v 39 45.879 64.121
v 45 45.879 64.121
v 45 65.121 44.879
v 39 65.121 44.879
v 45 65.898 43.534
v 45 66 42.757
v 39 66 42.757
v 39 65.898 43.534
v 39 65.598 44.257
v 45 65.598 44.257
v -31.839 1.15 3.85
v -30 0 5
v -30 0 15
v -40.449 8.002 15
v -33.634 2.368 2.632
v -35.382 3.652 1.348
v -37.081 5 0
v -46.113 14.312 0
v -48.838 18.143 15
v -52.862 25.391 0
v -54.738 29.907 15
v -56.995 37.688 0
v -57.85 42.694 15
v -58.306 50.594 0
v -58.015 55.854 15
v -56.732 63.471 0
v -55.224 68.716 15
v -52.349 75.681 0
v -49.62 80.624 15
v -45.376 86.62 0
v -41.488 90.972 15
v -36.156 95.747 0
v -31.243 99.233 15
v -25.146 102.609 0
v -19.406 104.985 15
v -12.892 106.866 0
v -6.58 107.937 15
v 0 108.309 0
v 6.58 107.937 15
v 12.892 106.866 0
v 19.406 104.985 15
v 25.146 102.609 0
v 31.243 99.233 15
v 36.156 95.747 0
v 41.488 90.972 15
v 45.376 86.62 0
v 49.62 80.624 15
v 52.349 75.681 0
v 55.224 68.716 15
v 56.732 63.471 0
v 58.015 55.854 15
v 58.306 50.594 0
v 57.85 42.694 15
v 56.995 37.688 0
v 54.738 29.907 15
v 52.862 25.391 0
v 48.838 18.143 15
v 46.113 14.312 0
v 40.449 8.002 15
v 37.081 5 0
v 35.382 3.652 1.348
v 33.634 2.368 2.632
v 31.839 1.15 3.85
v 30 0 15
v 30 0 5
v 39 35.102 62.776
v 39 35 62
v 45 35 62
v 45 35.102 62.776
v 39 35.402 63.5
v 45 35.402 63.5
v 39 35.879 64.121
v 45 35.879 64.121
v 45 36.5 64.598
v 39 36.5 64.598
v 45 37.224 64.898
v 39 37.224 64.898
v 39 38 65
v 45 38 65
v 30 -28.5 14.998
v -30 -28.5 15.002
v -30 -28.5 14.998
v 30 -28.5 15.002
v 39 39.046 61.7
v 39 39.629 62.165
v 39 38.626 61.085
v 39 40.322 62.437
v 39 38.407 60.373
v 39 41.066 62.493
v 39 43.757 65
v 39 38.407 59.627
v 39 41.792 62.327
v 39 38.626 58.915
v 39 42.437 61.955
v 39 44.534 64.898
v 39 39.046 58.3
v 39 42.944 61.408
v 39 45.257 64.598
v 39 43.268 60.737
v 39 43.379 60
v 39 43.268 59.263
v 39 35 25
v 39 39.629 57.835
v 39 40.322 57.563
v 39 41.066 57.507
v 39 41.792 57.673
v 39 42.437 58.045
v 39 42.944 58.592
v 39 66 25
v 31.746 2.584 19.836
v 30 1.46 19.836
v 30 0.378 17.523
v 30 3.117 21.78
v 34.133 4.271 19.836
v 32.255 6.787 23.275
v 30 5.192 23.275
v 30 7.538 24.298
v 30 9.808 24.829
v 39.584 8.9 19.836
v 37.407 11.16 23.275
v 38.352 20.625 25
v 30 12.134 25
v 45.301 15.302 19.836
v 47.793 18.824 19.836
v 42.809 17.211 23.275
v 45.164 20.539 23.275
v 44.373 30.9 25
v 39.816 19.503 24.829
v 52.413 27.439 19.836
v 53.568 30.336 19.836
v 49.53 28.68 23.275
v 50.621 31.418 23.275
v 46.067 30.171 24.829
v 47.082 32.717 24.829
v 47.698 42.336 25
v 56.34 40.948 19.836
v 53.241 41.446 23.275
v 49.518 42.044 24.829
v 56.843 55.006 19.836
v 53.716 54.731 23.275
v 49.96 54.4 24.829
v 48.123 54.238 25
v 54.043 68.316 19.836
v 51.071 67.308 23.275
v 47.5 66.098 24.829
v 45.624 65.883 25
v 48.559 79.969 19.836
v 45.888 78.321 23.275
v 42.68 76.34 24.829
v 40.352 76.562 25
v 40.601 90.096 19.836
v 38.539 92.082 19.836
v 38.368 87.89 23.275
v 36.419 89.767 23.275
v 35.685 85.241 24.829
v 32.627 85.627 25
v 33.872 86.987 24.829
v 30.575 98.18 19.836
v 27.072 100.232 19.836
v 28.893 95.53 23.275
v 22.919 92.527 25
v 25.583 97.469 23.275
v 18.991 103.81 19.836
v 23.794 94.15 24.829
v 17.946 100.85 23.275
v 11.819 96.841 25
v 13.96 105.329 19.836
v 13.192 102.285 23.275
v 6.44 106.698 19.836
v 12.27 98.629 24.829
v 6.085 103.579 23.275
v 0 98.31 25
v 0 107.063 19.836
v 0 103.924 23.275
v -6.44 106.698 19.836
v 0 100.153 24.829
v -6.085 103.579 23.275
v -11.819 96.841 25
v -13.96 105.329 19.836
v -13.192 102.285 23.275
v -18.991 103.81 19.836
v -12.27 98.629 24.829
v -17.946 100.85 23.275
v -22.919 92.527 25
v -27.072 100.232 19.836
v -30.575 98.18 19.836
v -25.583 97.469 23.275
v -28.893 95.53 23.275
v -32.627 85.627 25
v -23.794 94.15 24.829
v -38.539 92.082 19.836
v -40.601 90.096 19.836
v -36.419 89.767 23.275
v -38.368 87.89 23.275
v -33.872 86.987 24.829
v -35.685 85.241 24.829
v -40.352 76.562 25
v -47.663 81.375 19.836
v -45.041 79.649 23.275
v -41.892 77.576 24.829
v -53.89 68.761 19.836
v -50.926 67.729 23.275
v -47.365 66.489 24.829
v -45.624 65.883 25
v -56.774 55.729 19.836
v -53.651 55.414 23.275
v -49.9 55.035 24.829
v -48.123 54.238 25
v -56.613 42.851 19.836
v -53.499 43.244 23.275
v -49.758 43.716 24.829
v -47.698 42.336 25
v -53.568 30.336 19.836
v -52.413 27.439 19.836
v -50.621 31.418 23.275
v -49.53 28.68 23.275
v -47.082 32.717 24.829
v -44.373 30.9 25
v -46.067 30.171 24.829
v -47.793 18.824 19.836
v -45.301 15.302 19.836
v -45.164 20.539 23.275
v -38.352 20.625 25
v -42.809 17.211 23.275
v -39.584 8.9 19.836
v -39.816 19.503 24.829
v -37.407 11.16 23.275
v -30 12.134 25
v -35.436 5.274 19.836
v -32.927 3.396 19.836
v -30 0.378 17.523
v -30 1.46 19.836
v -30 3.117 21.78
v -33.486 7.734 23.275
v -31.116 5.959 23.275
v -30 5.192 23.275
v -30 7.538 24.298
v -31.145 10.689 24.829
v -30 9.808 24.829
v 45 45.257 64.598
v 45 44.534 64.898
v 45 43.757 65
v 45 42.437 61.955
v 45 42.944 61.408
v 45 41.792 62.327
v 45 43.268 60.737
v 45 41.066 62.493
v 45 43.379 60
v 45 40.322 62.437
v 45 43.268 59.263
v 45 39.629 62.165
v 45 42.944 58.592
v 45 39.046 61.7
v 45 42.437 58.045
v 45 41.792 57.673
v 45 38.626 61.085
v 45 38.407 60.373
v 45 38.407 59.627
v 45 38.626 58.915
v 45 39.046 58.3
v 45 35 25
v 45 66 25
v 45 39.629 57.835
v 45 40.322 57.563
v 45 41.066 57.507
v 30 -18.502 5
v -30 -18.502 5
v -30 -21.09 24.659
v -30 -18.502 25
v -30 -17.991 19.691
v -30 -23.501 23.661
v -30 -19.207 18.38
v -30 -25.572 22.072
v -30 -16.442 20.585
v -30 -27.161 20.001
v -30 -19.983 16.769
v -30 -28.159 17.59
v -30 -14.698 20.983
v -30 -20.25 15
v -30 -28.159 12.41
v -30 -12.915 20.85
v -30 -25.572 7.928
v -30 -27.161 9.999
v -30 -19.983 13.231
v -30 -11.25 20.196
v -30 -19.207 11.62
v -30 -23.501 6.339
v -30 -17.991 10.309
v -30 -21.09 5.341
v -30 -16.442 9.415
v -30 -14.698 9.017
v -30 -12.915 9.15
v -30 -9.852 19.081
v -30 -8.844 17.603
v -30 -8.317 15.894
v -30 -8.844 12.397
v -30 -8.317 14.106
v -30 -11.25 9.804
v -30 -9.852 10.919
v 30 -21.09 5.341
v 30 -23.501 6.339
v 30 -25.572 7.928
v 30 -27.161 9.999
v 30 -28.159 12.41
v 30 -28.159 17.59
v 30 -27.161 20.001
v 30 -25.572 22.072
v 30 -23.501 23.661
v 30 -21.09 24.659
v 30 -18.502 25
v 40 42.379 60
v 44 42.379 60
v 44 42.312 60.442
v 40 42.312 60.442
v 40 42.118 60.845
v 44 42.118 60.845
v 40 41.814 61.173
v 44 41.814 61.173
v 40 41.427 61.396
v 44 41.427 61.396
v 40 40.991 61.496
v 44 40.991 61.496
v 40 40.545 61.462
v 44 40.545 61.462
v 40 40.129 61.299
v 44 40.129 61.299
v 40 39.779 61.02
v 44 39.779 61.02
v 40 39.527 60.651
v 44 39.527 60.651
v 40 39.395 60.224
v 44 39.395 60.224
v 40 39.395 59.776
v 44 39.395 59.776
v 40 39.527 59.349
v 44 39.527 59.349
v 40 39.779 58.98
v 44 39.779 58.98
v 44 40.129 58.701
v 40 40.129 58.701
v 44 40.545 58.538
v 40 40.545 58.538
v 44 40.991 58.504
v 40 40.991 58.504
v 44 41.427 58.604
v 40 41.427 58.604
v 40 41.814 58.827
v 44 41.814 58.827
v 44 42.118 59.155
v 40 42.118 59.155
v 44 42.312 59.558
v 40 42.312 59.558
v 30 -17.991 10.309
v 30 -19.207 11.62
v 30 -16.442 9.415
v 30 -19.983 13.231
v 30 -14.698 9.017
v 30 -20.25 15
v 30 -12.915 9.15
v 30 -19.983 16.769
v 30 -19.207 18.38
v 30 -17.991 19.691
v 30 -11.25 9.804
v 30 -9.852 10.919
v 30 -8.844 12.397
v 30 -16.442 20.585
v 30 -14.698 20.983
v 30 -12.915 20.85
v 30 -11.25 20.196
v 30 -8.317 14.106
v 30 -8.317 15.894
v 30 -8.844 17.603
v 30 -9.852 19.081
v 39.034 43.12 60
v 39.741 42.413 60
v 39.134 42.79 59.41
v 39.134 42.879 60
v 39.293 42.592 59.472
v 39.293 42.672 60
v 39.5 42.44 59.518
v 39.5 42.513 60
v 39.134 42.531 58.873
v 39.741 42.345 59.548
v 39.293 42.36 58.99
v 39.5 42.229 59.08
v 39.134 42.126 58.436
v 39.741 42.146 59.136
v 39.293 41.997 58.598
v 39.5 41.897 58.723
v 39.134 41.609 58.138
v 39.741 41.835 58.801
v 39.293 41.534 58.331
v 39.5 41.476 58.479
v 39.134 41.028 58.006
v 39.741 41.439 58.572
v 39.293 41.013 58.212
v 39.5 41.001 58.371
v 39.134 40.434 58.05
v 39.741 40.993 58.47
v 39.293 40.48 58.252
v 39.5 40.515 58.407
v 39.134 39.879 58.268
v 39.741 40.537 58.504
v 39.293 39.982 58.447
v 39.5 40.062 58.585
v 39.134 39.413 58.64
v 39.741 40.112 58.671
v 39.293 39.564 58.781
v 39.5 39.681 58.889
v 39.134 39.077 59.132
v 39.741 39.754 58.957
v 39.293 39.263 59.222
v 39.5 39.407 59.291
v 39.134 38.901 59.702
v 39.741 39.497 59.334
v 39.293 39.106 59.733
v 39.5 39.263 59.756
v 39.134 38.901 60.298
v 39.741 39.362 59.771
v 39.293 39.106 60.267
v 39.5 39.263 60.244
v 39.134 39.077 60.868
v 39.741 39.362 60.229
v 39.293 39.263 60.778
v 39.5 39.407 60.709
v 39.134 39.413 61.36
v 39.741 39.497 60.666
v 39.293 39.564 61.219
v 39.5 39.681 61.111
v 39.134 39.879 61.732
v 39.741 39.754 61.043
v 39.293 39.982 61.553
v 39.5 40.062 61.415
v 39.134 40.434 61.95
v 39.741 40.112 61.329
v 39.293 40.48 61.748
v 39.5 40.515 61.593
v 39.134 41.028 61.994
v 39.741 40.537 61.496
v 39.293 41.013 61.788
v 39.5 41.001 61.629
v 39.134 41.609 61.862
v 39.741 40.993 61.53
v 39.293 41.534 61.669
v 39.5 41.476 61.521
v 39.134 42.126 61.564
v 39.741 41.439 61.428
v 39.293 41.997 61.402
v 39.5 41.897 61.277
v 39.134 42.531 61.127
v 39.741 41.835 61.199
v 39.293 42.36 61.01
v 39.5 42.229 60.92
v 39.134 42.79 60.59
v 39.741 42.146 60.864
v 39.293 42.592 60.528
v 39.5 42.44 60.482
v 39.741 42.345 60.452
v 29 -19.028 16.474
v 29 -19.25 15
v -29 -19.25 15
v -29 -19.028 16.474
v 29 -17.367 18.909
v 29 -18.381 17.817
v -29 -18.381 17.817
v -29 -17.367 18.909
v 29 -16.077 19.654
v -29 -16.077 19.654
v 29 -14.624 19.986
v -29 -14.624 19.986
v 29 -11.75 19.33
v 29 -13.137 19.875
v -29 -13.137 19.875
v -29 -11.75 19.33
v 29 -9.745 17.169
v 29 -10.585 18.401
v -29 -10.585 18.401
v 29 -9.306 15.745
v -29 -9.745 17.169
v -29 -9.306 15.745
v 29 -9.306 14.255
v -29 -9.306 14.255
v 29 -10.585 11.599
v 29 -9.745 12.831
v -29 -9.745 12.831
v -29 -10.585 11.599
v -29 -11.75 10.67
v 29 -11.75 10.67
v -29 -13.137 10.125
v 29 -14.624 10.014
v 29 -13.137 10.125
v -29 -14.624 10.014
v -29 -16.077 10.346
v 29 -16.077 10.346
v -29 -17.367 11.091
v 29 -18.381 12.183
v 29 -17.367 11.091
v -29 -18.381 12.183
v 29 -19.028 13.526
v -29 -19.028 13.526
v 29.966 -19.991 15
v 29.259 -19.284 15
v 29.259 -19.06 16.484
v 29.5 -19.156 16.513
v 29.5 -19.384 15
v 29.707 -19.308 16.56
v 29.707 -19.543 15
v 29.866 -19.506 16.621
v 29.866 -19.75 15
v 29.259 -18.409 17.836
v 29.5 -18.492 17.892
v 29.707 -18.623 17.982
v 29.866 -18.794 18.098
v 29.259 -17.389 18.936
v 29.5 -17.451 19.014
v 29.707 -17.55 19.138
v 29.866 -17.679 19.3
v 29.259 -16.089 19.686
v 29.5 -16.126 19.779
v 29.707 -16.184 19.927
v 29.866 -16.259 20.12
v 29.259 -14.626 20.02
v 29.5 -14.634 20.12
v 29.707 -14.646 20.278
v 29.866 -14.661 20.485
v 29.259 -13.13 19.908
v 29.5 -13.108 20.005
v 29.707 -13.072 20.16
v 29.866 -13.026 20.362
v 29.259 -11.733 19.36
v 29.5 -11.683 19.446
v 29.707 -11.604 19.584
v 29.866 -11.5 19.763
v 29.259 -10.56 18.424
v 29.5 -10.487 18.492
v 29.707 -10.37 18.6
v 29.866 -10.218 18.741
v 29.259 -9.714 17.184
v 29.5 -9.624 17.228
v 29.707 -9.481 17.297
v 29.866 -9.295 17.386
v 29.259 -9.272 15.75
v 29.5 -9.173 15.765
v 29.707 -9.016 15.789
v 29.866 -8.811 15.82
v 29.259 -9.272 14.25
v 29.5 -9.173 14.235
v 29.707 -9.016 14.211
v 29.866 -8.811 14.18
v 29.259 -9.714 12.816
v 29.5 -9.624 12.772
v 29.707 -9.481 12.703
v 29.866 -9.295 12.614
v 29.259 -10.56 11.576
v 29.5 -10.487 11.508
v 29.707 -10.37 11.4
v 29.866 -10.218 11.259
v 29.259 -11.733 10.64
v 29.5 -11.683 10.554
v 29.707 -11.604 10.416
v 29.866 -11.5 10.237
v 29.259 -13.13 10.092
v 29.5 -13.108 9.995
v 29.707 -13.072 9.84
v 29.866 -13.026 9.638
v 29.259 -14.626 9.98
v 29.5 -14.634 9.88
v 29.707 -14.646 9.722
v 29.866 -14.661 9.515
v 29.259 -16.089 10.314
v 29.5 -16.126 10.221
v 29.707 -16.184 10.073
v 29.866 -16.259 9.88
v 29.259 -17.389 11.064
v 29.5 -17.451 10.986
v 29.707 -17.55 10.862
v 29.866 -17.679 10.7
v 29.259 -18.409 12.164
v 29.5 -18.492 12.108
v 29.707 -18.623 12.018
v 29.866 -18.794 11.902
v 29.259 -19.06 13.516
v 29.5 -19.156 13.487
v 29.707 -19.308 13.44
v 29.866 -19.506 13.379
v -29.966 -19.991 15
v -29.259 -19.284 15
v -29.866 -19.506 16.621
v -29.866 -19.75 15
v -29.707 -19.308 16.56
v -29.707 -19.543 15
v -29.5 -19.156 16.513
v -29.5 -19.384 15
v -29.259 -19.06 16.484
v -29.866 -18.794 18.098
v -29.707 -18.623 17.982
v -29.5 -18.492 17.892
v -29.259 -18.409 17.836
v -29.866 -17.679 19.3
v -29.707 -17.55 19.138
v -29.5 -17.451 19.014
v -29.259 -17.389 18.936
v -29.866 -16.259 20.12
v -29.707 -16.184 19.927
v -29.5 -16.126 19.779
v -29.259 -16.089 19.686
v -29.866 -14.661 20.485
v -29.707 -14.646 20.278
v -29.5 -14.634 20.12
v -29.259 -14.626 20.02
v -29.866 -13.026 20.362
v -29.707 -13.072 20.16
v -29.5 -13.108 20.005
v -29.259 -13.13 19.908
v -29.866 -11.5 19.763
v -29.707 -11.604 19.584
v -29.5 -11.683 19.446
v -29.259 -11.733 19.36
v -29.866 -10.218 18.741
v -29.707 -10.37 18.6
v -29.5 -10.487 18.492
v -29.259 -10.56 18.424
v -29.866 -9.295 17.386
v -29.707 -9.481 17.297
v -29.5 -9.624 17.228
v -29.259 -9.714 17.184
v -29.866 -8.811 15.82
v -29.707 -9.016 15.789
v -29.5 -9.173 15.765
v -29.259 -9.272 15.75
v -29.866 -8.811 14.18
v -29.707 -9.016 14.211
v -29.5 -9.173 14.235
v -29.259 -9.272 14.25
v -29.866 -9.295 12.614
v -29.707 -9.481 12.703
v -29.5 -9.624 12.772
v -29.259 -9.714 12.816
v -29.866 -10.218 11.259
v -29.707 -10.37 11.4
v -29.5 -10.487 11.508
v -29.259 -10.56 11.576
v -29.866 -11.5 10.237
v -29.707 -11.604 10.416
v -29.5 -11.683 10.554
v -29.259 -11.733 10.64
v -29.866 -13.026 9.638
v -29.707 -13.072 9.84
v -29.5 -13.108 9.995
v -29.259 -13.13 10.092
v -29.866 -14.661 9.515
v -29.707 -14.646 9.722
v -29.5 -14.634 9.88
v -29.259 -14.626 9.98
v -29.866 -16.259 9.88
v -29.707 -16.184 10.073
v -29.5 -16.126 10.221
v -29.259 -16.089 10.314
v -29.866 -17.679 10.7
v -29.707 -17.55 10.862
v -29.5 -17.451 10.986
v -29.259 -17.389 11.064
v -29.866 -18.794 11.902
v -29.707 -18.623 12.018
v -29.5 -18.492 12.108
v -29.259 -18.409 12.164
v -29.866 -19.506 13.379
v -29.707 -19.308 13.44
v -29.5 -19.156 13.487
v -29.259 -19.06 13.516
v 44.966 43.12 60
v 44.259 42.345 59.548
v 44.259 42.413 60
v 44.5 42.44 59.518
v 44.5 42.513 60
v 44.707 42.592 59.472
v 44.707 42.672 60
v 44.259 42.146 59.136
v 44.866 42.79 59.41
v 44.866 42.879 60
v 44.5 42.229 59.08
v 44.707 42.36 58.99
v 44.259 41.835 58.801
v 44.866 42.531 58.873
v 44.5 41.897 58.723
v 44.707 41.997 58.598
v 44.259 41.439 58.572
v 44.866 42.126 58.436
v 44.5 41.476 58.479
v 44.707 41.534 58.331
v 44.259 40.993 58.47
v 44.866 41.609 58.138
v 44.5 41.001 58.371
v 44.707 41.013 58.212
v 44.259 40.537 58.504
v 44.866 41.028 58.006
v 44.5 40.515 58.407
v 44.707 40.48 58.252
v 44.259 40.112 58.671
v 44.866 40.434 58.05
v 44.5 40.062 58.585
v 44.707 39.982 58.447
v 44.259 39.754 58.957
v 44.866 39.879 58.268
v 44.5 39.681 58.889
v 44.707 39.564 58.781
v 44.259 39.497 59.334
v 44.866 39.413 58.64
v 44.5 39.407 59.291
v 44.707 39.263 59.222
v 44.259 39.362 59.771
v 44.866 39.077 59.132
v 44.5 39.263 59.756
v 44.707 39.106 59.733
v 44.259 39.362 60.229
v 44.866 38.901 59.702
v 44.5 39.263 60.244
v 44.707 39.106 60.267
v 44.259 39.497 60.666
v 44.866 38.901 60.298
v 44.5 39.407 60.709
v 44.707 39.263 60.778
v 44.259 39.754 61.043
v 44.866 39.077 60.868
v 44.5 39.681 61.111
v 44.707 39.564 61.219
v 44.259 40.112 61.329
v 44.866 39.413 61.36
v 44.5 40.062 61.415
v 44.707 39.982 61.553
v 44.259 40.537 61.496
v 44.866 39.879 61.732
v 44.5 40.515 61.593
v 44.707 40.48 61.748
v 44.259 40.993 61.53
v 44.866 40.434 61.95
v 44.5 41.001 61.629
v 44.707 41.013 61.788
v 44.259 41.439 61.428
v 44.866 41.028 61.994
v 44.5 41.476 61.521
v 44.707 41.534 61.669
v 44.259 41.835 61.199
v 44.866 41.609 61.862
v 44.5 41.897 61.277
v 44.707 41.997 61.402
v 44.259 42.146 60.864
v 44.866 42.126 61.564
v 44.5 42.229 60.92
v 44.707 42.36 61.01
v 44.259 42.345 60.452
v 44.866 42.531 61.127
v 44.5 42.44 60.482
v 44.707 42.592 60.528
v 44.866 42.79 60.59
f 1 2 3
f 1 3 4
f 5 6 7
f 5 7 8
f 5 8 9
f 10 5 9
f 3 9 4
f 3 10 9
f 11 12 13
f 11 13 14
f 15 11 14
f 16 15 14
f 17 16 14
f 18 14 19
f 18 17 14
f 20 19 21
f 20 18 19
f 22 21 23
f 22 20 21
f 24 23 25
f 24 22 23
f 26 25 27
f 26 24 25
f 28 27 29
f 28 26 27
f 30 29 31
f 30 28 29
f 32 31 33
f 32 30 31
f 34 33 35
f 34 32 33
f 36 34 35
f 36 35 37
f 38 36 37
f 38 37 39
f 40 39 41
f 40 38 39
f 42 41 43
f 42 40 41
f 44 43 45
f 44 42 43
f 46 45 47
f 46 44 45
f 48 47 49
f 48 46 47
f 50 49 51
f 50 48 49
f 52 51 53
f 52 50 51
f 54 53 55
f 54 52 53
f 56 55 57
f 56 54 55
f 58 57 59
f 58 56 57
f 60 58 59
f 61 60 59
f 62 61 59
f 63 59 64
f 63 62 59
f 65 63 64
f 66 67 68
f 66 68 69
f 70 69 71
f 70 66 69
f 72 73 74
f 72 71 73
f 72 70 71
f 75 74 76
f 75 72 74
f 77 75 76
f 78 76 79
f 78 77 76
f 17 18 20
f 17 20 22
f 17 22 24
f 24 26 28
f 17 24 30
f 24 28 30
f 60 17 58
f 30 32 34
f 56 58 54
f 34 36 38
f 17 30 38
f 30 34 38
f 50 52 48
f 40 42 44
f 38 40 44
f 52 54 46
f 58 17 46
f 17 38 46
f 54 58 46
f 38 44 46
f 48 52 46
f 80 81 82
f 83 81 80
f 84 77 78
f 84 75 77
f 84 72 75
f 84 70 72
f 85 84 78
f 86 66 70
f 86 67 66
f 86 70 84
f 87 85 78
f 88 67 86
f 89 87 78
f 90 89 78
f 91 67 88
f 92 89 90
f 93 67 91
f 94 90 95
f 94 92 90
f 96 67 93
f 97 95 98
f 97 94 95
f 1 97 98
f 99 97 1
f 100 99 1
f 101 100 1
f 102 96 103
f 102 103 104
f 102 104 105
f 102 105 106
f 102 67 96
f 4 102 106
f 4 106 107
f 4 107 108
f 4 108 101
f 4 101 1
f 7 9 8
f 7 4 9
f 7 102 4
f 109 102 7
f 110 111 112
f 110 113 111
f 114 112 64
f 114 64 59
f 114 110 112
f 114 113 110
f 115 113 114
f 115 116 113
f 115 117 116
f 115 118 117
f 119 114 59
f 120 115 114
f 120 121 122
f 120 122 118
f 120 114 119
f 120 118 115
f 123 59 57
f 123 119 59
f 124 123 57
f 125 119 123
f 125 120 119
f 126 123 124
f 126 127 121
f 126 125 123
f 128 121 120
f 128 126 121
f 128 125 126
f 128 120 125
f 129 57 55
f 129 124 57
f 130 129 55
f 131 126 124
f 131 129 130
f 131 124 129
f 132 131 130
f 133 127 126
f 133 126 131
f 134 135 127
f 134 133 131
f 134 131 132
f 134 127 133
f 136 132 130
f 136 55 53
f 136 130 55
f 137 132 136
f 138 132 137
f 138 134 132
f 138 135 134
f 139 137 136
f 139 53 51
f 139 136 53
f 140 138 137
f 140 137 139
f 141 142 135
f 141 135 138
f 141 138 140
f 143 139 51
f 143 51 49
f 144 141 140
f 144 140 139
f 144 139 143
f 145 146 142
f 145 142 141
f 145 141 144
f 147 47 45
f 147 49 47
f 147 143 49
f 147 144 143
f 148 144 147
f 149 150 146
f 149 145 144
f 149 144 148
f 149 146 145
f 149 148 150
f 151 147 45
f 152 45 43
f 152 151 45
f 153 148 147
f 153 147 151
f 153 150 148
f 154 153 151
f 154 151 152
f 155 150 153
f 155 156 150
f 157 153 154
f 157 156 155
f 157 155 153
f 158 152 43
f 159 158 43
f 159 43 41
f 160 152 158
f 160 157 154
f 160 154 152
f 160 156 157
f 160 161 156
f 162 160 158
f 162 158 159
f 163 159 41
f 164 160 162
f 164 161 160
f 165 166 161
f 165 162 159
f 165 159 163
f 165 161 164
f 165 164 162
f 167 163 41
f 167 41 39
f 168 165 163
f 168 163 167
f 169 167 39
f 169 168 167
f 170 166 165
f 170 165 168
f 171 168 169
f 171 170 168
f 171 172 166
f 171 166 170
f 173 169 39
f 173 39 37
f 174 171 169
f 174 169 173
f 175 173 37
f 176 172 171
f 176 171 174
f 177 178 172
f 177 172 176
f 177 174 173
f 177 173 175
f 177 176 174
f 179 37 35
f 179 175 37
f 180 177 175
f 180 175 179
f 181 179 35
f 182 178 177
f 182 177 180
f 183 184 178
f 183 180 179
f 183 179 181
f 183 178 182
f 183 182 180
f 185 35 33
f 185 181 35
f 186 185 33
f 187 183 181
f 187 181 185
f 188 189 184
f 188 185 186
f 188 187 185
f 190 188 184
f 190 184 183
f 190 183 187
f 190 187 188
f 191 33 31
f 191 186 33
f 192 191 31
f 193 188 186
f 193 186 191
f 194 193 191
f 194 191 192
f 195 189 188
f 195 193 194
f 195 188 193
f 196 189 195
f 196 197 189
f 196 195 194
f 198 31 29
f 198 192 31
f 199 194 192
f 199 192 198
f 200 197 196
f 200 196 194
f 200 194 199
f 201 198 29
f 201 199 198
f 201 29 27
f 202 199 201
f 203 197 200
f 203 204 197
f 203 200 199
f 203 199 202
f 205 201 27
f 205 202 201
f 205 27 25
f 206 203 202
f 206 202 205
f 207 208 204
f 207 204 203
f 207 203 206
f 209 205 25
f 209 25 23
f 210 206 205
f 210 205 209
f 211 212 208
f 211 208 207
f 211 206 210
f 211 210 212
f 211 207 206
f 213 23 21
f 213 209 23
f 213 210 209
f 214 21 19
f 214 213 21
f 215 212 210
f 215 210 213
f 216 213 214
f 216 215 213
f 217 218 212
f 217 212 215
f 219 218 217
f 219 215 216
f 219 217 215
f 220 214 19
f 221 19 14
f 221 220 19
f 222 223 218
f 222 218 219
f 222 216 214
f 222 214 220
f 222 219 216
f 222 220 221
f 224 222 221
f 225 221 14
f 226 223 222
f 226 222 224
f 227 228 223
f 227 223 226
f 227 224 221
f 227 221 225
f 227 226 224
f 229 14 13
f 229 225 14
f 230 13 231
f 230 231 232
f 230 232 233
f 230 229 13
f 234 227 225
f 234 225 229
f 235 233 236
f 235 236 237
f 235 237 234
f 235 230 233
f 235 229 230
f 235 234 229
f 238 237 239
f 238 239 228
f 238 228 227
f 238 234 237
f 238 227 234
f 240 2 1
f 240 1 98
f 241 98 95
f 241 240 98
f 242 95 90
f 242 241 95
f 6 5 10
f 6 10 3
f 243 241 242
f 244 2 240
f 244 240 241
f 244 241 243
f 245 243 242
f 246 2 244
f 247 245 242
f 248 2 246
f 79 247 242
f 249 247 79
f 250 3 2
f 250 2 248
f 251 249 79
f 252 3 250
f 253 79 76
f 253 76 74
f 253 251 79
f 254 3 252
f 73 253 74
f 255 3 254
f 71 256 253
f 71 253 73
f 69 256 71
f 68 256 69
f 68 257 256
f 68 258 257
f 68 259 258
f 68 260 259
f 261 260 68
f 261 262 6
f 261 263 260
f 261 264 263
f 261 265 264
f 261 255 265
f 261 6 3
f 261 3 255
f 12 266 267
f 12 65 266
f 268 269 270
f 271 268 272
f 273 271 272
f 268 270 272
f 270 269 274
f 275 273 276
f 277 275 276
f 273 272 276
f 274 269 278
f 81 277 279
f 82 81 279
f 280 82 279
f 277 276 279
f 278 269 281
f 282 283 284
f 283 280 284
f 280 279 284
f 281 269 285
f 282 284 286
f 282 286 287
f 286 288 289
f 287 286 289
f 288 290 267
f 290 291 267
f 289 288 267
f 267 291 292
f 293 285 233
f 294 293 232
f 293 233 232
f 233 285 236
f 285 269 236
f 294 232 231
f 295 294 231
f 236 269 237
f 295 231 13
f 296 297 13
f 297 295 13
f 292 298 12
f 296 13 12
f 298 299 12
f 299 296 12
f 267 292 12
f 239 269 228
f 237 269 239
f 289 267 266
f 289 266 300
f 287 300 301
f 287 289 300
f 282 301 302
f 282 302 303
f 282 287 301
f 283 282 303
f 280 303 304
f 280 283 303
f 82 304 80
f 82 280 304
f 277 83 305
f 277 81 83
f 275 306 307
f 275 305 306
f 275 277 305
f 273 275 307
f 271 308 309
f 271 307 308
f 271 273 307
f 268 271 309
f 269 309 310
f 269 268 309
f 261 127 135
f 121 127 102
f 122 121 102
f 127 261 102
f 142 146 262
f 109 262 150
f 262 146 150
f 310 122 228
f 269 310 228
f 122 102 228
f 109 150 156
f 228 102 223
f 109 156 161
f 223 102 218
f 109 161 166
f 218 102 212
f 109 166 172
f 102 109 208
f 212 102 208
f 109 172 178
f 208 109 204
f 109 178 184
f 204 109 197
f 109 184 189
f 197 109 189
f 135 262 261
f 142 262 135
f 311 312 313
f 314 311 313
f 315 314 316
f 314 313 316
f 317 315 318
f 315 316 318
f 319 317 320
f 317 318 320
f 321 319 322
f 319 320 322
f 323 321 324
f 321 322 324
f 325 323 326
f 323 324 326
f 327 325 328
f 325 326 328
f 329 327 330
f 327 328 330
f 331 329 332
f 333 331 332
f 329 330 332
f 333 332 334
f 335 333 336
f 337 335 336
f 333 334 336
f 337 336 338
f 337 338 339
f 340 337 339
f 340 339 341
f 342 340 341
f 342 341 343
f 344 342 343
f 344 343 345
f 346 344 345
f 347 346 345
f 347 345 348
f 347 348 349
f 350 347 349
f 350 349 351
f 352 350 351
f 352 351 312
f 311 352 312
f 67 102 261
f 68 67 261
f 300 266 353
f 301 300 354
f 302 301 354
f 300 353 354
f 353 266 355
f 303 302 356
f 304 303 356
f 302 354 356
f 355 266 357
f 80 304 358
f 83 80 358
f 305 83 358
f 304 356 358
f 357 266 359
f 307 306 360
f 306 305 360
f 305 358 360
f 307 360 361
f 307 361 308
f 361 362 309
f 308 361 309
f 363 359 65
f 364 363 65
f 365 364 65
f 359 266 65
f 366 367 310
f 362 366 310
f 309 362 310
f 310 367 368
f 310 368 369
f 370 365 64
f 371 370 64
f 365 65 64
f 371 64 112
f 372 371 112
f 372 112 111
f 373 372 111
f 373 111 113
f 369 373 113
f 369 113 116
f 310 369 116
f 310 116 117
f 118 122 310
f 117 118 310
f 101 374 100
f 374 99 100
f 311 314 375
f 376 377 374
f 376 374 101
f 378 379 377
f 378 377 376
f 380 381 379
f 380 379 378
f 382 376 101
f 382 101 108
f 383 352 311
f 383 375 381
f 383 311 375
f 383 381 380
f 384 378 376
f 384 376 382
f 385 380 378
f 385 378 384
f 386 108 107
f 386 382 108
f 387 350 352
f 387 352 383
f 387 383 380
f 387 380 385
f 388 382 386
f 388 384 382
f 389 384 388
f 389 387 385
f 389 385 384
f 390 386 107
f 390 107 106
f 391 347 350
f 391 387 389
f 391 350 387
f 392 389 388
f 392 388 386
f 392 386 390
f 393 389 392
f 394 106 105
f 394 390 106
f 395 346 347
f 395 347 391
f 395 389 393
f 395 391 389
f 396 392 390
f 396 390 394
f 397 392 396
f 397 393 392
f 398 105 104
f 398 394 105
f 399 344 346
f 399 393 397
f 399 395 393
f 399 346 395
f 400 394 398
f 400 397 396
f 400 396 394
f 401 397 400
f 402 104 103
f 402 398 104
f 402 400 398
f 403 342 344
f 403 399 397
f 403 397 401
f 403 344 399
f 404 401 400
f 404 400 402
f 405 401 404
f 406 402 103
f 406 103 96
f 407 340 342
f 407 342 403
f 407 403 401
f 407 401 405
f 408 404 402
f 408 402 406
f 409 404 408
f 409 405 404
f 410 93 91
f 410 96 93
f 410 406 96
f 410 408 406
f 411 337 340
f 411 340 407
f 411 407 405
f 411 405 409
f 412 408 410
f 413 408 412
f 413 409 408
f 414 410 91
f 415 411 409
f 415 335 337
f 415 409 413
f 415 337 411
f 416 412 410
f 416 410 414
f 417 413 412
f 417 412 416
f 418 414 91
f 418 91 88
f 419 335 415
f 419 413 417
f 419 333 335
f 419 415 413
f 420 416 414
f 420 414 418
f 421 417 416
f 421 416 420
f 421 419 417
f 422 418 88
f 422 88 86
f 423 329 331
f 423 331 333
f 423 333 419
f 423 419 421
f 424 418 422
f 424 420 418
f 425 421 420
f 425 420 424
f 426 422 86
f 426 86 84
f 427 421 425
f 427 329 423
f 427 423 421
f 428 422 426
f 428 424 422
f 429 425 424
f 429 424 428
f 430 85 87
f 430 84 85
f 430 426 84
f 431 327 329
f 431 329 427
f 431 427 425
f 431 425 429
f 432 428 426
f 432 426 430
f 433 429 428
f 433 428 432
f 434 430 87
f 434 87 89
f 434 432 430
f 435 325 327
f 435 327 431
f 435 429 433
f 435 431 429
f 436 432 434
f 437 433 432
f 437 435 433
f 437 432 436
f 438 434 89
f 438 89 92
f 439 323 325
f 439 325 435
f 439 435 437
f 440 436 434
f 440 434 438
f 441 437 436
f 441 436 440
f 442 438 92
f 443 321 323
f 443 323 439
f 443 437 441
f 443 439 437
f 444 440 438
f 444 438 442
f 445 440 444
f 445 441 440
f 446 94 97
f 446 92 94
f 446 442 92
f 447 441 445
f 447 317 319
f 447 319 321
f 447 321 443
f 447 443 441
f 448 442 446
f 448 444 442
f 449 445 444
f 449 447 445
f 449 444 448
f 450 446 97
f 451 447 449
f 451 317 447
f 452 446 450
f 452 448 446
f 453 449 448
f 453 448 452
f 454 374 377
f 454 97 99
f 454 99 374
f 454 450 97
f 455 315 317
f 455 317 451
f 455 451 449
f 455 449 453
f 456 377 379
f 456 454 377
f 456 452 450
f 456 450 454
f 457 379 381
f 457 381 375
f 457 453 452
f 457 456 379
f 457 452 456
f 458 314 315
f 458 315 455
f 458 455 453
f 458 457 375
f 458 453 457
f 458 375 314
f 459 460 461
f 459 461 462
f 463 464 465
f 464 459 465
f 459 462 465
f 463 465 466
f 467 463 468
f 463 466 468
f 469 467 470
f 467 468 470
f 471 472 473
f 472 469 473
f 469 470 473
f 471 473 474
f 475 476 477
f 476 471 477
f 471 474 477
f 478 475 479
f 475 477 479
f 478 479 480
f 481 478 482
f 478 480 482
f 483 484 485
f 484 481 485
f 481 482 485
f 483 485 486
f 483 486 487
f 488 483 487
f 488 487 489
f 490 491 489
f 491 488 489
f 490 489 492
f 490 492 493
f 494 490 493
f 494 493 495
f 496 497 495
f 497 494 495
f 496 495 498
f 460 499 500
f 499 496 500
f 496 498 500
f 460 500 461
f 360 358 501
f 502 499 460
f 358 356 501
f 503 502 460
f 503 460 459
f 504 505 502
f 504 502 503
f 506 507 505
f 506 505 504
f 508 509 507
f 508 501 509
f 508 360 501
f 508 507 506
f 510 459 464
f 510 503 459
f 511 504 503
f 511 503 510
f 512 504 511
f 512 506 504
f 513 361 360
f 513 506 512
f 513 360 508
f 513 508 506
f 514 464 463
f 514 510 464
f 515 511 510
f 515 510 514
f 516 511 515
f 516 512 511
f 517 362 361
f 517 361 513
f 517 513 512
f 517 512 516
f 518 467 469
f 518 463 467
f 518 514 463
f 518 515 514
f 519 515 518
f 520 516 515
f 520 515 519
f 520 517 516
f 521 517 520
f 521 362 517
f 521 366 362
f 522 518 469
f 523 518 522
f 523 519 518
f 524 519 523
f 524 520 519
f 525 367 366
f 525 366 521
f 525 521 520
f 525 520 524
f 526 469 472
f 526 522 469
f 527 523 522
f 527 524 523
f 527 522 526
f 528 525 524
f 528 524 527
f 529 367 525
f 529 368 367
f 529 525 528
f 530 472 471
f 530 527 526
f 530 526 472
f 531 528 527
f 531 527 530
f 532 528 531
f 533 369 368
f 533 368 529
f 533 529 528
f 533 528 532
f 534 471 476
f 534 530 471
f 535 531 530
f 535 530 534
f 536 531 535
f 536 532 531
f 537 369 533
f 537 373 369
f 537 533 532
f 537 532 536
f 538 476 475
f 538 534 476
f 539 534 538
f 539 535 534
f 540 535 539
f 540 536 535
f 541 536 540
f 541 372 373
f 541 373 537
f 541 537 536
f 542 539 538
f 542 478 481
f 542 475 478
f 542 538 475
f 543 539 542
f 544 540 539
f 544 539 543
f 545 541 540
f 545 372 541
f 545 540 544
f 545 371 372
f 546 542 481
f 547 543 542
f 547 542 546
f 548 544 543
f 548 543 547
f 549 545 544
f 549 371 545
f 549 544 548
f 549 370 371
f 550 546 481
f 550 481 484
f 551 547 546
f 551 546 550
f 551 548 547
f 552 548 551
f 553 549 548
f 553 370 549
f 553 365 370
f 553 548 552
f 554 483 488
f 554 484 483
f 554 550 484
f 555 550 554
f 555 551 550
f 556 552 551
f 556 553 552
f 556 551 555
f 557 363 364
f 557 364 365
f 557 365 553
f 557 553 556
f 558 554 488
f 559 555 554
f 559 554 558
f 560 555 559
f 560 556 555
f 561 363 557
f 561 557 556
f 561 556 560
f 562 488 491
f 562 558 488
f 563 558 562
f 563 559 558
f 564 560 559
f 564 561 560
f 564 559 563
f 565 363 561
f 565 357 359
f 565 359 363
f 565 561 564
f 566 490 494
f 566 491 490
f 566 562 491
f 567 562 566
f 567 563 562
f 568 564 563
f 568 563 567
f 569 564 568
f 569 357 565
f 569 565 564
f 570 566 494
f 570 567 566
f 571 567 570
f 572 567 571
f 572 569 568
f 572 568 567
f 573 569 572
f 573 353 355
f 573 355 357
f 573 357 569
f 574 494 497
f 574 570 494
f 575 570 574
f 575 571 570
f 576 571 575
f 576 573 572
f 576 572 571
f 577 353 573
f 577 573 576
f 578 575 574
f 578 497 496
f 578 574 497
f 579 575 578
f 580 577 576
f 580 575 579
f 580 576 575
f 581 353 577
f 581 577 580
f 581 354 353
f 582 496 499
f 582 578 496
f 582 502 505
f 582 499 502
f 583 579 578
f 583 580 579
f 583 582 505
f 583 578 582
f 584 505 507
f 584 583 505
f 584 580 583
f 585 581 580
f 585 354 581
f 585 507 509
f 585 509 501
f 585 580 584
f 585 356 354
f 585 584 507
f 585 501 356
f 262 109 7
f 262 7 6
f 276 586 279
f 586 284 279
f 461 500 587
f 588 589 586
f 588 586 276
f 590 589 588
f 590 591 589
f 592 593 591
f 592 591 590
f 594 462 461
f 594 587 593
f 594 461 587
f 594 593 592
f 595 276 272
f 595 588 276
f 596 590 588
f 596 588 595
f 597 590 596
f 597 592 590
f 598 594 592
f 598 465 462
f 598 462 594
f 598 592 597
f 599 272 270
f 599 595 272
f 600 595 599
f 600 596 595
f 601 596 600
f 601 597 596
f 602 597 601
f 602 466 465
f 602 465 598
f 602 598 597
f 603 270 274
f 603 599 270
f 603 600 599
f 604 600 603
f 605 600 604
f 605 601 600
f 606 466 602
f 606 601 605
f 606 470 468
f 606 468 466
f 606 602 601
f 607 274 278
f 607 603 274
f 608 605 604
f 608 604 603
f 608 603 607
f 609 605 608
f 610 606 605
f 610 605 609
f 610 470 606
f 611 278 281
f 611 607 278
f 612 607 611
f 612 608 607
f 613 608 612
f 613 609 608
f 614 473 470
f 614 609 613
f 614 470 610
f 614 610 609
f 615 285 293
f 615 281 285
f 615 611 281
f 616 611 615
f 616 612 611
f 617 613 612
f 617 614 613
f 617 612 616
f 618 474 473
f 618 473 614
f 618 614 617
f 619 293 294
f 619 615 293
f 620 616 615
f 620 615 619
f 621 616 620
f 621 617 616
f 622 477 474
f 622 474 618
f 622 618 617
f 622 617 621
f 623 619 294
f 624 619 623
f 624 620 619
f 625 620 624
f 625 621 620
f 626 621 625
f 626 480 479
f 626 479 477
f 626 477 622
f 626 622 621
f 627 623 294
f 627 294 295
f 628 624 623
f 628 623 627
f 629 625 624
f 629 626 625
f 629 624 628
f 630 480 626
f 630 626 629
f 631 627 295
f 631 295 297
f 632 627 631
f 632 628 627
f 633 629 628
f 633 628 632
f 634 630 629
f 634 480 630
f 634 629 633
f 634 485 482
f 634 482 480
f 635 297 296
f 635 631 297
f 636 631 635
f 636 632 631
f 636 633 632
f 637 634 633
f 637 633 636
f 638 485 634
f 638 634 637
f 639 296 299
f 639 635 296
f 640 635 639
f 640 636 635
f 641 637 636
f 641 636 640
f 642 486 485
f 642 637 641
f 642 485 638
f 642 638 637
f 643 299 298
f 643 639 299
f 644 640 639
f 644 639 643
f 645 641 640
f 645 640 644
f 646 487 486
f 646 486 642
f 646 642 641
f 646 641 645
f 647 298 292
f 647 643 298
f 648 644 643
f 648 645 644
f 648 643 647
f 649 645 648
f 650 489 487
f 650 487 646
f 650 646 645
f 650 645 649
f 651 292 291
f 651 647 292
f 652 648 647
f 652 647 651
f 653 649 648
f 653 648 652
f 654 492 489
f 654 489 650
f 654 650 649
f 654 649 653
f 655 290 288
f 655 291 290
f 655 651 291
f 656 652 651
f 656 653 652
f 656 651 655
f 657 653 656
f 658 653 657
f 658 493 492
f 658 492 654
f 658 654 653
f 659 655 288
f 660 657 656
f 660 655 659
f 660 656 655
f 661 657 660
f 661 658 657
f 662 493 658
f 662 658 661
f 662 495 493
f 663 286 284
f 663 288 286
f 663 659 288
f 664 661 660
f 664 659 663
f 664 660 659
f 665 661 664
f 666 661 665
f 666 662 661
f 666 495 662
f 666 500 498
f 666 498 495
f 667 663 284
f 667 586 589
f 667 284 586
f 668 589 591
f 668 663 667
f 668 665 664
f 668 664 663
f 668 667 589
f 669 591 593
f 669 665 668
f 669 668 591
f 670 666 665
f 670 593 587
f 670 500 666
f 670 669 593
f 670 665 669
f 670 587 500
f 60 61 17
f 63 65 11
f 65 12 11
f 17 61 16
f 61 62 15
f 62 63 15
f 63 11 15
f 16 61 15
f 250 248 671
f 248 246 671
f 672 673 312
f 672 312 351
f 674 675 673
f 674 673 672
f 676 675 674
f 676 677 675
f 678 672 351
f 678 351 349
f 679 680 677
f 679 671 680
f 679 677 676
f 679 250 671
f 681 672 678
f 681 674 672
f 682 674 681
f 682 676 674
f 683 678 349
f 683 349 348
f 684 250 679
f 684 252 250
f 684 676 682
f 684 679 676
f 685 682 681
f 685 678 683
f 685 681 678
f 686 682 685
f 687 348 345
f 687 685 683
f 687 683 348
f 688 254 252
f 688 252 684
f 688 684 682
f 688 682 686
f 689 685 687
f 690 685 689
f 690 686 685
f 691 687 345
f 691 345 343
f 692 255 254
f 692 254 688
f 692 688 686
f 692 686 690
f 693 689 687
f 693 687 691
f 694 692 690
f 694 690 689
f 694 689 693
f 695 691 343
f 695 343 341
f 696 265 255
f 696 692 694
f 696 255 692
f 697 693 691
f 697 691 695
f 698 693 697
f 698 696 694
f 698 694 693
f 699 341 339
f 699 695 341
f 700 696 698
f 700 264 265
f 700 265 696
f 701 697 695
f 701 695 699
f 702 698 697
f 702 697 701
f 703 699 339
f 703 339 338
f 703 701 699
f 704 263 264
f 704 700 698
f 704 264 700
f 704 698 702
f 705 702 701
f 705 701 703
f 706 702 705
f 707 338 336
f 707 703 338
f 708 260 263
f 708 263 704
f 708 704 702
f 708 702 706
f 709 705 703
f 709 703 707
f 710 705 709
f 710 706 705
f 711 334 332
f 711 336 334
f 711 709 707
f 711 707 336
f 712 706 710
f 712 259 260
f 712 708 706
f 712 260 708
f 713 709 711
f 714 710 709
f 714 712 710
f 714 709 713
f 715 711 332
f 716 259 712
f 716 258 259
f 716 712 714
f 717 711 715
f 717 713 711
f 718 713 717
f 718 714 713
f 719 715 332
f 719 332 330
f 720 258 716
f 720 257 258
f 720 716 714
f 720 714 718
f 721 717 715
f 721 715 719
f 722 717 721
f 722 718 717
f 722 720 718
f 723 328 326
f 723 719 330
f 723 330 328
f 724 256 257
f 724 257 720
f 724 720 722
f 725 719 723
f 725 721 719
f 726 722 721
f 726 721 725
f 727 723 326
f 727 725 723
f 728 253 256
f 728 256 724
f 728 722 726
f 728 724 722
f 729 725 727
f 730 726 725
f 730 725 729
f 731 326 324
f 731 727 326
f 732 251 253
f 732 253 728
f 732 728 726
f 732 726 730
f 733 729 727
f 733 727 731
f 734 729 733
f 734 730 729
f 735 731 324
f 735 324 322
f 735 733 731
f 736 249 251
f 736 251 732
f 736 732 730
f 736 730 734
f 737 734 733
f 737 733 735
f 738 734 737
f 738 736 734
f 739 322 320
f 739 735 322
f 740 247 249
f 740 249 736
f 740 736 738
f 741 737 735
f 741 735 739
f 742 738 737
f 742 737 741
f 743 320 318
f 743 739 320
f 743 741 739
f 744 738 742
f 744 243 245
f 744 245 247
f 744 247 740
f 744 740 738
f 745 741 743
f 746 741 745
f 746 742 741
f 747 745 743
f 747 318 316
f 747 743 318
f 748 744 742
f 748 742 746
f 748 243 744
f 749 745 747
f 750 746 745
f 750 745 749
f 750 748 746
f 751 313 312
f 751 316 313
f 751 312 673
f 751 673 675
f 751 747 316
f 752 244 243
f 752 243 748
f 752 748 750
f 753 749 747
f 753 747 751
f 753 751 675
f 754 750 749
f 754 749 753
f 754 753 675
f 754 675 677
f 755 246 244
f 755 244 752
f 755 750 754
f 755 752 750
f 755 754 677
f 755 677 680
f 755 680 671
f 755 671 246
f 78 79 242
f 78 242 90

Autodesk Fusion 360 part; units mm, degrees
sketch "Sketch1" plane through (0, 0, 0) normal (0, 0, 1) x (1, 0, 0)
  line L0 (0, 0) -> (30, 0)
  line L1 (0, 0) -> (-30, 0)
  circle A0 centre (0, 50) radius 58.3095
  line L2 (0, 7) -> (39.3827, 7)
  line L3 (0, 7) -> (-39.3827, 7)
  dimension "d1" = 30
  dimension "d2" = 7
extrude "Extrude1" add sketch "Sketch1" along normal blind 25 contours A0 L2 L3
extrude "Extrude2" add sketch "Sketch1" along normal blind 25 contours L0 L1 A0 L2 L3
sketch "Sketch2" plane through (0, 0, 0) normal (0, -1, 0) x (1, 0, 0)
  line L0 (-30, 0) -> (30, 0)
  line L1 (30, 0) -> (30, 25)
  line L2 (30, 25) -> (-30, 25)
  line L3 (-30, 25) -> (-30, 0)
  line L4 (-30, 0) -> (-30, 10)
  line L5 (30, 0) -> (30, 5)
  line L6 (30, 5) -> (-30, 5)
  dimension "d7" = 10
  dimension "d8" = 5
chamfer "Chamfer1" distance 5 angle 45 1 edges at (0, 0, 0)
extrude "Extrude3" add sketch "Sketch2" along normal blind 28.5 contours L1 L2 L3 L4 L6
sketch "Sketch3" plane through (-30, 0, 0) normal (-1, 0, 0) x (0, -1, 0)
  line L0 (0, 25) -> (0, 5)
  line L1 (0, 5) -> (28.5, 5)
  line L2 (28.5, 5) -> (28.5, 25)
  line L3 (28.5, 25) -> (0, 25)
  line L4 (28.5, 25) -> (14.25, 25)
  line L5 (14.25, 25) -> (14.25, 15)
  circle A0 centre (14.25, 15) radius 5
  dimension "d12" = 10
  dimension "d13" = 10
extrude "Extrude4" cut sketch "Sketch3" against normal blind 60 contours A0
fillet "Fillet1" radius 1 2 edges at (-30, -9.5884, 16.8081) (30, -9.5884, 13.1919)
fillet "Fillet2" radius 10 2 edges at (0, -28.5, 25) (0, -28.5, 5)
fillet "Fillet3" radius 10 1 edges at (0, 108.3095, 25)
sketch "Sketch4" plane through (0, 0, 25) normal (0, 0, 1) x (-1, 0, 0)
  line L0 (30, -12.1343) -> (30, 18.5)
  line L1 (30, 18.5) -> (-30, 18.5)
  line L2 (-30, 18.5) -> (-30, -12.1343)
  arc A0 (-30, -12.1343) -> (30, -12.1343) centre (0, -50) ccw
  line L3 (-30, -12.1343) -> (-30, -35)
  line L4 (-30, -35) -> (-42, -35)
  line L5 (-42, -35) -> (-45, -35)
  line L6 (-45, -35) -> (-39, -35)
  line L7 (-39, -35) -> (-39, -66)
  line L8 (-39, -66) -> (-45, -66)
  line L9 (-45, -66) -> (-45, -35)
  dimension "d22" = 12
  dimension "d23" = 3
extrude "Extrude5" add sketch "Sketch4" along normal blind 40 contours L4 L5 L6 L7 L8 L9
chamfer "Chamfer2" distance 21 angle 45 1 edges at (42, 66, 65)
fillet "Fillet4" radius 3 3 edges at (42, 35, 65) (42, 45, 65) (42, 66, 44)
sketch "Sketch5" plane through (45, 0, 0) normal (1, 0, 0) x (0, 1, 0)
  arc A0 (66, 42.7574) -> (65.1213, 44.8787) centre (63, 42.7574) ccw
  line L0 (65.1213, 44.8787) -> (45.8787, 64.1213)
  arc A1 (45.8787, 64.1213) -> (43.7574, 65) centre (43.7574, 62) ccw
  line L1 (43.7574, 65) -> (38, 65)
  arc A2 (38, 65) -> (35, 62) centre (38, 62) ccw
  line L2 (35, 62) -> (35, 25)
  line L3 (35, 25) -> (66, 25)
  line L4 (66, 25) -> (66, 42.7574)
  circle A3 centre (40.8787, 60) radius 1.5
  dimension "d29" = 3
extrude "Extrude6" cut sketch "Sketch5" against normal blind 6 contours A3
fillet "Fillet5" radius 1 2 edges at (39, 39.4802, 59.4576) (45, 39.4802, 60.5424)
